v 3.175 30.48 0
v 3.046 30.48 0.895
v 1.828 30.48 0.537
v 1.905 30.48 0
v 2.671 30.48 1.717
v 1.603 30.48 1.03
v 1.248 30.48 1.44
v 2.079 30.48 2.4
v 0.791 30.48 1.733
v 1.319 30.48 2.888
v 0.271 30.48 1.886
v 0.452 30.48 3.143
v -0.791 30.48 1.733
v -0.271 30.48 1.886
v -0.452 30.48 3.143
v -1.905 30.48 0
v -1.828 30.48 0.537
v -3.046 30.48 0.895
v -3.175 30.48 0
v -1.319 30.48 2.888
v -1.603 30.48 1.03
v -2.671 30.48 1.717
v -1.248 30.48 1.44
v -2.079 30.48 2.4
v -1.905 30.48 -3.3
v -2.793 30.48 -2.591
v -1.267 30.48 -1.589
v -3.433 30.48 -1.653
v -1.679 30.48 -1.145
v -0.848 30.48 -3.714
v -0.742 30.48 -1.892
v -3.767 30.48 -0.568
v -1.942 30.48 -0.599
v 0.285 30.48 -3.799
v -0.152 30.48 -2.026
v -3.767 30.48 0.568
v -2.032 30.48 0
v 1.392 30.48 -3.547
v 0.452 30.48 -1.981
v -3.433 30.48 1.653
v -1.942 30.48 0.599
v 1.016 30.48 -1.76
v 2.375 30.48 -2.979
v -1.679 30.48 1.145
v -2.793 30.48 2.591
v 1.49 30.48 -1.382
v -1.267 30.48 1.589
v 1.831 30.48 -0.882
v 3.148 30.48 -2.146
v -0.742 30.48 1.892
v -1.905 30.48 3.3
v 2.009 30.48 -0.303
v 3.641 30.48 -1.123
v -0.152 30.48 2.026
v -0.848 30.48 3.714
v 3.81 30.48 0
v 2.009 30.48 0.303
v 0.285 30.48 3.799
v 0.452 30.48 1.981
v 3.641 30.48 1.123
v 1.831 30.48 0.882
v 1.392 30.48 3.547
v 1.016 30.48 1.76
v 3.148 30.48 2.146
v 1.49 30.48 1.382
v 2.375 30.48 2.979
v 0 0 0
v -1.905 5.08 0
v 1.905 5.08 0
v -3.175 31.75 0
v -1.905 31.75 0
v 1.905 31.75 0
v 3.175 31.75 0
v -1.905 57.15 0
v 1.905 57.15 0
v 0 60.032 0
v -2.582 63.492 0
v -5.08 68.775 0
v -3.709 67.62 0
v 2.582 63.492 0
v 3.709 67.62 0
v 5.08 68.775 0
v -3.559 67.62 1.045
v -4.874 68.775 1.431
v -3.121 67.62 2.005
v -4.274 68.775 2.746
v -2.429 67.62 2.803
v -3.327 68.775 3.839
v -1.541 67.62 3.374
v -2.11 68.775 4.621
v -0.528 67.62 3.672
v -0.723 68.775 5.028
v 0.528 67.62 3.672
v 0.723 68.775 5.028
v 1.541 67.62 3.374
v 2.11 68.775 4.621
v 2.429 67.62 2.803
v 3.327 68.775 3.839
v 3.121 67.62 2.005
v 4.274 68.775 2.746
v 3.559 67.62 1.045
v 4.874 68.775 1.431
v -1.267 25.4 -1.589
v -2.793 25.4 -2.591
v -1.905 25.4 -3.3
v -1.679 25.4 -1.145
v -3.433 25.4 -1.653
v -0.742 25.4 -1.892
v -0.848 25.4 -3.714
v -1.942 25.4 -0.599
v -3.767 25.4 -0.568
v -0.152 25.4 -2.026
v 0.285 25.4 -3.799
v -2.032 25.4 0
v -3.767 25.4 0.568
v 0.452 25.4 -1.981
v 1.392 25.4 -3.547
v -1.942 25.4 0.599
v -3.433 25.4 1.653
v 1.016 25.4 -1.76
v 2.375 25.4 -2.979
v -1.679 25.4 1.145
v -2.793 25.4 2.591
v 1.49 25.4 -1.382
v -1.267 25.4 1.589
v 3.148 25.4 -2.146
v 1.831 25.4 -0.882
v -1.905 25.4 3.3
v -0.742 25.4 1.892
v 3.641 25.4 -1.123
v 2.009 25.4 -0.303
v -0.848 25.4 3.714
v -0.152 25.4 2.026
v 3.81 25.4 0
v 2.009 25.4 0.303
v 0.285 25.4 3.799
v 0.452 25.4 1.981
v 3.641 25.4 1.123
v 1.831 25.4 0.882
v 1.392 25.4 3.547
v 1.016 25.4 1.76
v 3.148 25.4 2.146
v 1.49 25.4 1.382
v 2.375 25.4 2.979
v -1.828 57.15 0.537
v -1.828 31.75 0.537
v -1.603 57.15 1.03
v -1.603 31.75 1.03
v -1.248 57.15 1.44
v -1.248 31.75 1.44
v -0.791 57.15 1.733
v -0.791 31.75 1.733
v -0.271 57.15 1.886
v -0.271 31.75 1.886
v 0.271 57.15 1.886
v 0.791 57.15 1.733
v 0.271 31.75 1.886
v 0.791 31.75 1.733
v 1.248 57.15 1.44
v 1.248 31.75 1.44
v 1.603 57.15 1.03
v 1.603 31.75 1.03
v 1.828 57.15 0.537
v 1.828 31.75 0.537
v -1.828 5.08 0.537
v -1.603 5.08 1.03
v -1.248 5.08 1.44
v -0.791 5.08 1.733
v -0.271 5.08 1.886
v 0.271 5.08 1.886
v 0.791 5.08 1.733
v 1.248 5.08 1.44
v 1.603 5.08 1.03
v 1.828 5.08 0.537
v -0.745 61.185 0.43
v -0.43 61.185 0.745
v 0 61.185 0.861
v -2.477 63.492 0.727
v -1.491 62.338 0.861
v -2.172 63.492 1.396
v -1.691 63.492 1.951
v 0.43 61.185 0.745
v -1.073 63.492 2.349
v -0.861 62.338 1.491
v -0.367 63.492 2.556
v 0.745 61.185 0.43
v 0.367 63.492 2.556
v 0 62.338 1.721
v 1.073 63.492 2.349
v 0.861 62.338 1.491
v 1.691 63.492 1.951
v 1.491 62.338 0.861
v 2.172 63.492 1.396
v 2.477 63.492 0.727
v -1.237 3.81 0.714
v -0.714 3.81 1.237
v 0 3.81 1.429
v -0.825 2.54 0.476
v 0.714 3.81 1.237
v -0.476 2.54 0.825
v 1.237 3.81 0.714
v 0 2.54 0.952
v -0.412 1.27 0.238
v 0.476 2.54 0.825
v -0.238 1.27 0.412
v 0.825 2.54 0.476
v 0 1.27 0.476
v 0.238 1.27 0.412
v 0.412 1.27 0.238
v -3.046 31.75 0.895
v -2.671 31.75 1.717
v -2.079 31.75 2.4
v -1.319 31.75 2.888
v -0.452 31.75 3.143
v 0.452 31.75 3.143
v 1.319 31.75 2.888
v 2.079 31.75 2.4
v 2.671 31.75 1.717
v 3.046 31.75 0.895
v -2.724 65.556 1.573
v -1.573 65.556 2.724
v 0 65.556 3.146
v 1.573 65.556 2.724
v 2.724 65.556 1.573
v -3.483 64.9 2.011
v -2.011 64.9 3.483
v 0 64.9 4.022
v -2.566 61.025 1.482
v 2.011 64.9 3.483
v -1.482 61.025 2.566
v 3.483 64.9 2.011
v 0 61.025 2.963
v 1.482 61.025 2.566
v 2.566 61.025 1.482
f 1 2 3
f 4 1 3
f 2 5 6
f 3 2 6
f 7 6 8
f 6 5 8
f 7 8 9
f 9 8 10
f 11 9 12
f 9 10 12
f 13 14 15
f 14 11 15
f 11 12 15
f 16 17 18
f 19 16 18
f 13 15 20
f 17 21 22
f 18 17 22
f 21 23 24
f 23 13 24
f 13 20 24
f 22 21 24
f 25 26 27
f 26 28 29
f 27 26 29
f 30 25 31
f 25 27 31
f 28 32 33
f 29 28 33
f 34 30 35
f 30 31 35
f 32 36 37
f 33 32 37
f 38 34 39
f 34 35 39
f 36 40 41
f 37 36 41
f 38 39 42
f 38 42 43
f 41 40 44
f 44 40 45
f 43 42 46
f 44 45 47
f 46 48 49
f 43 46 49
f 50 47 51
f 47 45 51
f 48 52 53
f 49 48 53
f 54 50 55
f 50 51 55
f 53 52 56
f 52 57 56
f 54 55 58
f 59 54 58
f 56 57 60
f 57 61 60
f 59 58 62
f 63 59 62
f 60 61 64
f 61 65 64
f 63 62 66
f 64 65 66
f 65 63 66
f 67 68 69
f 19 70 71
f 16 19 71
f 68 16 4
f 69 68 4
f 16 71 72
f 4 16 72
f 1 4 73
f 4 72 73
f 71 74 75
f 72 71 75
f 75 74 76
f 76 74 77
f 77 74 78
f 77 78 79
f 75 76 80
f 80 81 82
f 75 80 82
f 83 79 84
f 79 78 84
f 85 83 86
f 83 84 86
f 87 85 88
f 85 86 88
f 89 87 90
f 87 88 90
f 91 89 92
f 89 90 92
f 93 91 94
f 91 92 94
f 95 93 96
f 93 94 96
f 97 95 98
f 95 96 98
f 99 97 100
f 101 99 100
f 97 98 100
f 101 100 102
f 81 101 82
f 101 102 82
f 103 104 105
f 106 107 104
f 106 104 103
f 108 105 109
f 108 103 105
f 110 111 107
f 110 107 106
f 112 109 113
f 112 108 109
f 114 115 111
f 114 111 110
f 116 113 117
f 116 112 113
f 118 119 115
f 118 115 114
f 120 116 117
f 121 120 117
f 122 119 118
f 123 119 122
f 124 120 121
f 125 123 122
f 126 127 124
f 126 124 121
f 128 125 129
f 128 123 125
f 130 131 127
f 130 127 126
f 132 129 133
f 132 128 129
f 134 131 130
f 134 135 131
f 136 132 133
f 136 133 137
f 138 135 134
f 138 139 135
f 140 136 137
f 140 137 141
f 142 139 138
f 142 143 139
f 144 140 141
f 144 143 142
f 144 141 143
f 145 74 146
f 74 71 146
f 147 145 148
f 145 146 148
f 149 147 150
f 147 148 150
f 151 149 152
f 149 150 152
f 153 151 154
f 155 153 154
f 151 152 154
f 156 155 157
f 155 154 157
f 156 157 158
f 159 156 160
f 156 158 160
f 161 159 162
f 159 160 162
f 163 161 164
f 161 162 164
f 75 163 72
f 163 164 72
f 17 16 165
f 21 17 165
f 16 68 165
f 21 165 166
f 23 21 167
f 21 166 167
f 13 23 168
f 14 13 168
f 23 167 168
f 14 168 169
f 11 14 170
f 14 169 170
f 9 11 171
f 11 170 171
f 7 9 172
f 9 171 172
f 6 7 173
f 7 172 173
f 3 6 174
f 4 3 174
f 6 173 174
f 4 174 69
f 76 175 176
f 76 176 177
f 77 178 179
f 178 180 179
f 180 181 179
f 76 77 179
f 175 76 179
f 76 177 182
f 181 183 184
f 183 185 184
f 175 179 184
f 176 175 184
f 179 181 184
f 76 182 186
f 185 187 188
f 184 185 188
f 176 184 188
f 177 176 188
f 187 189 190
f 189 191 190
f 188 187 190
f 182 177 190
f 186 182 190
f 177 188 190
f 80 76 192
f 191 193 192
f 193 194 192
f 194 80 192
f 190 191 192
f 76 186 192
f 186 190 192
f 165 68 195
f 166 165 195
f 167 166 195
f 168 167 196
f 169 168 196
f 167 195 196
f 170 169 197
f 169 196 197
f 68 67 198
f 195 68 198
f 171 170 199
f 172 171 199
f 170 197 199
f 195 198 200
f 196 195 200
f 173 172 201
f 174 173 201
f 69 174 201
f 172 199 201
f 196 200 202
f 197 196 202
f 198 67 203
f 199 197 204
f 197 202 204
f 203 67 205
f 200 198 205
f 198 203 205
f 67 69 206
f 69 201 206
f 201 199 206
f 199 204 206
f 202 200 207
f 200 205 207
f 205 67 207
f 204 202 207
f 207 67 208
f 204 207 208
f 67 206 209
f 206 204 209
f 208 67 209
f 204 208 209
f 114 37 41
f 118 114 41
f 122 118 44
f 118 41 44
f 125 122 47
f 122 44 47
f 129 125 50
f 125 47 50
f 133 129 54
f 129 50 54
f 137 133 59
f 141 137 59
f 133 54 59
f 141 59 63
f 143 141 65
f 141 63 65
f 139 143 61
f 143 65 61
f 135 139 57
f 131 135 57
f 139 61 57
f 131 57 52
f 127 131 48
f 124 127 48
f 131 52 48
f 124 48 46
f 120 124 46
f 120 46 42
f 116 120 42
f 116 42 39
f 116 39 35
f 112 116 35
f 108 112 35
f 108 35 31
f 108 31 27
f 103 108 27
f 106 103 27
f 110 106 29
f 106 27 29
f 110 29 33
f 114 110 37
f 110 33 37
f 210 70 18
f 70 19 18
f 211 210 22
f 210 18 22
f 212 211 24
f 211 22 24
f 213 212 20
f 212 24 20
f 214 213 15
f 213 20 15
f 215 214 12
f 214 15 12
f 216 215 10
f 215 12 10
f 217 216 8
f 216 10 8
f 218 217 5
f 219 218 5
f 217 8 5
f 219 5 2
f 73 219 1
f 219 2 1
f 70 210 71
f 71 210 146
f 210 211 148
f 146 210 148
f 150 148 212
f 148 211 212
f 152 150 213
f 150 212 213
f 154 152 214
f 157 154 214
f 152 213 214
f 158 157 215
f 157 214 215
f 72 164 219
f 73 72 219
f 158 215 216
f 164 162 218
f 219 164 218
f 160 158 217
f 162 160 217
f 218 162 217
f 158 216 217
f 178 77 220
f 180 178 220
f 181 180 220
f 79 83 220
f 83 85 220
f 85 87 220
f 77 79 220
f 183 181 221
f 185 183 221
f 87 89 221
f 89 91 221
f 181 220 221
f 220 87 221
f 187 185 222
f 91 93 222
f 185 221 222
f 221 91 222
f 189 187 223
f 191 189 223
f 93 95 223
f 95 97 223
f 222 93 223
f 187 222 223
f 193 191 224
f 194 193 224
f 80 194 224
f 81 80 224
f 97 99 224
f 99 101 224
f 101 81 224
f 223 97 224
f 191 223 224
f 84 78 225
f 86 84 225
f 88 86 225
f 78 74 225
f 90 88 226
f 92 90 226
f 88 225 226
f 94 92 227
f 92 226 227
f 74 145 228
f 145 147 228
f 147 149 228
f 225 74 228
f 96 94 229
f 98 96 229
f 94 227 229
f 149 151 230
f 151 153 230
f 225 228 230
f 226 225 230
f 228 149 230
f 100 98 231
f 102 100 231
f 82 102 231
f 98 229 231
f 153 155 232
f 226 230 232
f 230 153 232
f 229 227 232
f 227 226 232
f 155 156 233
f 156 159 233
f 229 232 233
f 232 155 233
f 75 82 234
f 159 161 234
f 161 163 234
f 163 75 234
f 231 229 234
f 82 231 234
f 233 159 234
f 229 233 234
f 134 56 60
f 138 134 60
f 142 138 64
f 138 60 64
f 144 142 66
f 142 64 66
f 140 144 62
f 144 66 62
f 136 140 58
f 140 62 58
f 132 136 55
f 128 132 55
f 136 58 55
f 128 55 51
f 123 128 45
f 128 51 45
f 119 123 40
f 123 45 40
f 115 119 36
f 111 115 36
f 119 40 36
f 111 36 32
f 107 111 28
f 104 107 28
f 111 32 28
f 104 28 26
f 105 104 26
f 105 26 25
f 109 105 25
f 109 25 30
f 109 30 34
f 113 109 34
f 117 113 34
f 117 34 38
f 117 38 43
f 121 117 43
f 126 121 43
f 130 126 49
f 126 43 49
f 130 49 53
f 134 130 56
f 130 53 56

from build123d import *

# Parameters (mm, degrees)
F1_ANGLE = 180
F2_R     = 3.81
F3_DEPTH = 5.08


with BuildPart() as f1:
    # F0 (on Top) → F1 (revolve)
    with BuildSketch(Plane.XY):
        Polygon((-1.905, 5.08), (0, 0), (0, 60.031697), (-2.581929, 63.4916), (-3.709386, 67.619681), (-5.08, 68.774976), (-1.905, 57.15), (-1.905, 31.75), (-3.175, 31.75), (-3.175, 30.48), (-1.905, 30.48), align=None)
    revolve(axis=Axis((0, 30.015849, 0), (0, 1, 0)), revolution_arc=F1_ANGLE)


with BuildPart() as f3:
    # F2 (on face) → F3 (new body)
    with BuildSketch(Plane.XZ.offset(-30.48)):
        Circle(F2_R)
        with BuildLine():
            Line((3.175, 0), (2.032, 0))
            ThreePointArc((2.032, 0), (0, -2.032), (-2.032, 0))
            Line((-2.032, 0), (-3.175, 0))
            ThreePointArc((-3.175, 0), (0, 3.175), (3.175, 0))
        make_face(mode=Mode.SUBTRACT)
        with BuildLine():
            ThreePointArc((-2.032, 0), (0, 2.032), (2.032, 0))
            Line((2.032, 0), (3.175, 0))
            ThreePointArc((3.175, 0), (0, 3.175), (-3.175, 0))
            Line((-3.175, 0), (-2.032, 0))
        make_face()
    extrude(amount=F3_DEPTH)


solid = Compound([f1.part, f3.part])
